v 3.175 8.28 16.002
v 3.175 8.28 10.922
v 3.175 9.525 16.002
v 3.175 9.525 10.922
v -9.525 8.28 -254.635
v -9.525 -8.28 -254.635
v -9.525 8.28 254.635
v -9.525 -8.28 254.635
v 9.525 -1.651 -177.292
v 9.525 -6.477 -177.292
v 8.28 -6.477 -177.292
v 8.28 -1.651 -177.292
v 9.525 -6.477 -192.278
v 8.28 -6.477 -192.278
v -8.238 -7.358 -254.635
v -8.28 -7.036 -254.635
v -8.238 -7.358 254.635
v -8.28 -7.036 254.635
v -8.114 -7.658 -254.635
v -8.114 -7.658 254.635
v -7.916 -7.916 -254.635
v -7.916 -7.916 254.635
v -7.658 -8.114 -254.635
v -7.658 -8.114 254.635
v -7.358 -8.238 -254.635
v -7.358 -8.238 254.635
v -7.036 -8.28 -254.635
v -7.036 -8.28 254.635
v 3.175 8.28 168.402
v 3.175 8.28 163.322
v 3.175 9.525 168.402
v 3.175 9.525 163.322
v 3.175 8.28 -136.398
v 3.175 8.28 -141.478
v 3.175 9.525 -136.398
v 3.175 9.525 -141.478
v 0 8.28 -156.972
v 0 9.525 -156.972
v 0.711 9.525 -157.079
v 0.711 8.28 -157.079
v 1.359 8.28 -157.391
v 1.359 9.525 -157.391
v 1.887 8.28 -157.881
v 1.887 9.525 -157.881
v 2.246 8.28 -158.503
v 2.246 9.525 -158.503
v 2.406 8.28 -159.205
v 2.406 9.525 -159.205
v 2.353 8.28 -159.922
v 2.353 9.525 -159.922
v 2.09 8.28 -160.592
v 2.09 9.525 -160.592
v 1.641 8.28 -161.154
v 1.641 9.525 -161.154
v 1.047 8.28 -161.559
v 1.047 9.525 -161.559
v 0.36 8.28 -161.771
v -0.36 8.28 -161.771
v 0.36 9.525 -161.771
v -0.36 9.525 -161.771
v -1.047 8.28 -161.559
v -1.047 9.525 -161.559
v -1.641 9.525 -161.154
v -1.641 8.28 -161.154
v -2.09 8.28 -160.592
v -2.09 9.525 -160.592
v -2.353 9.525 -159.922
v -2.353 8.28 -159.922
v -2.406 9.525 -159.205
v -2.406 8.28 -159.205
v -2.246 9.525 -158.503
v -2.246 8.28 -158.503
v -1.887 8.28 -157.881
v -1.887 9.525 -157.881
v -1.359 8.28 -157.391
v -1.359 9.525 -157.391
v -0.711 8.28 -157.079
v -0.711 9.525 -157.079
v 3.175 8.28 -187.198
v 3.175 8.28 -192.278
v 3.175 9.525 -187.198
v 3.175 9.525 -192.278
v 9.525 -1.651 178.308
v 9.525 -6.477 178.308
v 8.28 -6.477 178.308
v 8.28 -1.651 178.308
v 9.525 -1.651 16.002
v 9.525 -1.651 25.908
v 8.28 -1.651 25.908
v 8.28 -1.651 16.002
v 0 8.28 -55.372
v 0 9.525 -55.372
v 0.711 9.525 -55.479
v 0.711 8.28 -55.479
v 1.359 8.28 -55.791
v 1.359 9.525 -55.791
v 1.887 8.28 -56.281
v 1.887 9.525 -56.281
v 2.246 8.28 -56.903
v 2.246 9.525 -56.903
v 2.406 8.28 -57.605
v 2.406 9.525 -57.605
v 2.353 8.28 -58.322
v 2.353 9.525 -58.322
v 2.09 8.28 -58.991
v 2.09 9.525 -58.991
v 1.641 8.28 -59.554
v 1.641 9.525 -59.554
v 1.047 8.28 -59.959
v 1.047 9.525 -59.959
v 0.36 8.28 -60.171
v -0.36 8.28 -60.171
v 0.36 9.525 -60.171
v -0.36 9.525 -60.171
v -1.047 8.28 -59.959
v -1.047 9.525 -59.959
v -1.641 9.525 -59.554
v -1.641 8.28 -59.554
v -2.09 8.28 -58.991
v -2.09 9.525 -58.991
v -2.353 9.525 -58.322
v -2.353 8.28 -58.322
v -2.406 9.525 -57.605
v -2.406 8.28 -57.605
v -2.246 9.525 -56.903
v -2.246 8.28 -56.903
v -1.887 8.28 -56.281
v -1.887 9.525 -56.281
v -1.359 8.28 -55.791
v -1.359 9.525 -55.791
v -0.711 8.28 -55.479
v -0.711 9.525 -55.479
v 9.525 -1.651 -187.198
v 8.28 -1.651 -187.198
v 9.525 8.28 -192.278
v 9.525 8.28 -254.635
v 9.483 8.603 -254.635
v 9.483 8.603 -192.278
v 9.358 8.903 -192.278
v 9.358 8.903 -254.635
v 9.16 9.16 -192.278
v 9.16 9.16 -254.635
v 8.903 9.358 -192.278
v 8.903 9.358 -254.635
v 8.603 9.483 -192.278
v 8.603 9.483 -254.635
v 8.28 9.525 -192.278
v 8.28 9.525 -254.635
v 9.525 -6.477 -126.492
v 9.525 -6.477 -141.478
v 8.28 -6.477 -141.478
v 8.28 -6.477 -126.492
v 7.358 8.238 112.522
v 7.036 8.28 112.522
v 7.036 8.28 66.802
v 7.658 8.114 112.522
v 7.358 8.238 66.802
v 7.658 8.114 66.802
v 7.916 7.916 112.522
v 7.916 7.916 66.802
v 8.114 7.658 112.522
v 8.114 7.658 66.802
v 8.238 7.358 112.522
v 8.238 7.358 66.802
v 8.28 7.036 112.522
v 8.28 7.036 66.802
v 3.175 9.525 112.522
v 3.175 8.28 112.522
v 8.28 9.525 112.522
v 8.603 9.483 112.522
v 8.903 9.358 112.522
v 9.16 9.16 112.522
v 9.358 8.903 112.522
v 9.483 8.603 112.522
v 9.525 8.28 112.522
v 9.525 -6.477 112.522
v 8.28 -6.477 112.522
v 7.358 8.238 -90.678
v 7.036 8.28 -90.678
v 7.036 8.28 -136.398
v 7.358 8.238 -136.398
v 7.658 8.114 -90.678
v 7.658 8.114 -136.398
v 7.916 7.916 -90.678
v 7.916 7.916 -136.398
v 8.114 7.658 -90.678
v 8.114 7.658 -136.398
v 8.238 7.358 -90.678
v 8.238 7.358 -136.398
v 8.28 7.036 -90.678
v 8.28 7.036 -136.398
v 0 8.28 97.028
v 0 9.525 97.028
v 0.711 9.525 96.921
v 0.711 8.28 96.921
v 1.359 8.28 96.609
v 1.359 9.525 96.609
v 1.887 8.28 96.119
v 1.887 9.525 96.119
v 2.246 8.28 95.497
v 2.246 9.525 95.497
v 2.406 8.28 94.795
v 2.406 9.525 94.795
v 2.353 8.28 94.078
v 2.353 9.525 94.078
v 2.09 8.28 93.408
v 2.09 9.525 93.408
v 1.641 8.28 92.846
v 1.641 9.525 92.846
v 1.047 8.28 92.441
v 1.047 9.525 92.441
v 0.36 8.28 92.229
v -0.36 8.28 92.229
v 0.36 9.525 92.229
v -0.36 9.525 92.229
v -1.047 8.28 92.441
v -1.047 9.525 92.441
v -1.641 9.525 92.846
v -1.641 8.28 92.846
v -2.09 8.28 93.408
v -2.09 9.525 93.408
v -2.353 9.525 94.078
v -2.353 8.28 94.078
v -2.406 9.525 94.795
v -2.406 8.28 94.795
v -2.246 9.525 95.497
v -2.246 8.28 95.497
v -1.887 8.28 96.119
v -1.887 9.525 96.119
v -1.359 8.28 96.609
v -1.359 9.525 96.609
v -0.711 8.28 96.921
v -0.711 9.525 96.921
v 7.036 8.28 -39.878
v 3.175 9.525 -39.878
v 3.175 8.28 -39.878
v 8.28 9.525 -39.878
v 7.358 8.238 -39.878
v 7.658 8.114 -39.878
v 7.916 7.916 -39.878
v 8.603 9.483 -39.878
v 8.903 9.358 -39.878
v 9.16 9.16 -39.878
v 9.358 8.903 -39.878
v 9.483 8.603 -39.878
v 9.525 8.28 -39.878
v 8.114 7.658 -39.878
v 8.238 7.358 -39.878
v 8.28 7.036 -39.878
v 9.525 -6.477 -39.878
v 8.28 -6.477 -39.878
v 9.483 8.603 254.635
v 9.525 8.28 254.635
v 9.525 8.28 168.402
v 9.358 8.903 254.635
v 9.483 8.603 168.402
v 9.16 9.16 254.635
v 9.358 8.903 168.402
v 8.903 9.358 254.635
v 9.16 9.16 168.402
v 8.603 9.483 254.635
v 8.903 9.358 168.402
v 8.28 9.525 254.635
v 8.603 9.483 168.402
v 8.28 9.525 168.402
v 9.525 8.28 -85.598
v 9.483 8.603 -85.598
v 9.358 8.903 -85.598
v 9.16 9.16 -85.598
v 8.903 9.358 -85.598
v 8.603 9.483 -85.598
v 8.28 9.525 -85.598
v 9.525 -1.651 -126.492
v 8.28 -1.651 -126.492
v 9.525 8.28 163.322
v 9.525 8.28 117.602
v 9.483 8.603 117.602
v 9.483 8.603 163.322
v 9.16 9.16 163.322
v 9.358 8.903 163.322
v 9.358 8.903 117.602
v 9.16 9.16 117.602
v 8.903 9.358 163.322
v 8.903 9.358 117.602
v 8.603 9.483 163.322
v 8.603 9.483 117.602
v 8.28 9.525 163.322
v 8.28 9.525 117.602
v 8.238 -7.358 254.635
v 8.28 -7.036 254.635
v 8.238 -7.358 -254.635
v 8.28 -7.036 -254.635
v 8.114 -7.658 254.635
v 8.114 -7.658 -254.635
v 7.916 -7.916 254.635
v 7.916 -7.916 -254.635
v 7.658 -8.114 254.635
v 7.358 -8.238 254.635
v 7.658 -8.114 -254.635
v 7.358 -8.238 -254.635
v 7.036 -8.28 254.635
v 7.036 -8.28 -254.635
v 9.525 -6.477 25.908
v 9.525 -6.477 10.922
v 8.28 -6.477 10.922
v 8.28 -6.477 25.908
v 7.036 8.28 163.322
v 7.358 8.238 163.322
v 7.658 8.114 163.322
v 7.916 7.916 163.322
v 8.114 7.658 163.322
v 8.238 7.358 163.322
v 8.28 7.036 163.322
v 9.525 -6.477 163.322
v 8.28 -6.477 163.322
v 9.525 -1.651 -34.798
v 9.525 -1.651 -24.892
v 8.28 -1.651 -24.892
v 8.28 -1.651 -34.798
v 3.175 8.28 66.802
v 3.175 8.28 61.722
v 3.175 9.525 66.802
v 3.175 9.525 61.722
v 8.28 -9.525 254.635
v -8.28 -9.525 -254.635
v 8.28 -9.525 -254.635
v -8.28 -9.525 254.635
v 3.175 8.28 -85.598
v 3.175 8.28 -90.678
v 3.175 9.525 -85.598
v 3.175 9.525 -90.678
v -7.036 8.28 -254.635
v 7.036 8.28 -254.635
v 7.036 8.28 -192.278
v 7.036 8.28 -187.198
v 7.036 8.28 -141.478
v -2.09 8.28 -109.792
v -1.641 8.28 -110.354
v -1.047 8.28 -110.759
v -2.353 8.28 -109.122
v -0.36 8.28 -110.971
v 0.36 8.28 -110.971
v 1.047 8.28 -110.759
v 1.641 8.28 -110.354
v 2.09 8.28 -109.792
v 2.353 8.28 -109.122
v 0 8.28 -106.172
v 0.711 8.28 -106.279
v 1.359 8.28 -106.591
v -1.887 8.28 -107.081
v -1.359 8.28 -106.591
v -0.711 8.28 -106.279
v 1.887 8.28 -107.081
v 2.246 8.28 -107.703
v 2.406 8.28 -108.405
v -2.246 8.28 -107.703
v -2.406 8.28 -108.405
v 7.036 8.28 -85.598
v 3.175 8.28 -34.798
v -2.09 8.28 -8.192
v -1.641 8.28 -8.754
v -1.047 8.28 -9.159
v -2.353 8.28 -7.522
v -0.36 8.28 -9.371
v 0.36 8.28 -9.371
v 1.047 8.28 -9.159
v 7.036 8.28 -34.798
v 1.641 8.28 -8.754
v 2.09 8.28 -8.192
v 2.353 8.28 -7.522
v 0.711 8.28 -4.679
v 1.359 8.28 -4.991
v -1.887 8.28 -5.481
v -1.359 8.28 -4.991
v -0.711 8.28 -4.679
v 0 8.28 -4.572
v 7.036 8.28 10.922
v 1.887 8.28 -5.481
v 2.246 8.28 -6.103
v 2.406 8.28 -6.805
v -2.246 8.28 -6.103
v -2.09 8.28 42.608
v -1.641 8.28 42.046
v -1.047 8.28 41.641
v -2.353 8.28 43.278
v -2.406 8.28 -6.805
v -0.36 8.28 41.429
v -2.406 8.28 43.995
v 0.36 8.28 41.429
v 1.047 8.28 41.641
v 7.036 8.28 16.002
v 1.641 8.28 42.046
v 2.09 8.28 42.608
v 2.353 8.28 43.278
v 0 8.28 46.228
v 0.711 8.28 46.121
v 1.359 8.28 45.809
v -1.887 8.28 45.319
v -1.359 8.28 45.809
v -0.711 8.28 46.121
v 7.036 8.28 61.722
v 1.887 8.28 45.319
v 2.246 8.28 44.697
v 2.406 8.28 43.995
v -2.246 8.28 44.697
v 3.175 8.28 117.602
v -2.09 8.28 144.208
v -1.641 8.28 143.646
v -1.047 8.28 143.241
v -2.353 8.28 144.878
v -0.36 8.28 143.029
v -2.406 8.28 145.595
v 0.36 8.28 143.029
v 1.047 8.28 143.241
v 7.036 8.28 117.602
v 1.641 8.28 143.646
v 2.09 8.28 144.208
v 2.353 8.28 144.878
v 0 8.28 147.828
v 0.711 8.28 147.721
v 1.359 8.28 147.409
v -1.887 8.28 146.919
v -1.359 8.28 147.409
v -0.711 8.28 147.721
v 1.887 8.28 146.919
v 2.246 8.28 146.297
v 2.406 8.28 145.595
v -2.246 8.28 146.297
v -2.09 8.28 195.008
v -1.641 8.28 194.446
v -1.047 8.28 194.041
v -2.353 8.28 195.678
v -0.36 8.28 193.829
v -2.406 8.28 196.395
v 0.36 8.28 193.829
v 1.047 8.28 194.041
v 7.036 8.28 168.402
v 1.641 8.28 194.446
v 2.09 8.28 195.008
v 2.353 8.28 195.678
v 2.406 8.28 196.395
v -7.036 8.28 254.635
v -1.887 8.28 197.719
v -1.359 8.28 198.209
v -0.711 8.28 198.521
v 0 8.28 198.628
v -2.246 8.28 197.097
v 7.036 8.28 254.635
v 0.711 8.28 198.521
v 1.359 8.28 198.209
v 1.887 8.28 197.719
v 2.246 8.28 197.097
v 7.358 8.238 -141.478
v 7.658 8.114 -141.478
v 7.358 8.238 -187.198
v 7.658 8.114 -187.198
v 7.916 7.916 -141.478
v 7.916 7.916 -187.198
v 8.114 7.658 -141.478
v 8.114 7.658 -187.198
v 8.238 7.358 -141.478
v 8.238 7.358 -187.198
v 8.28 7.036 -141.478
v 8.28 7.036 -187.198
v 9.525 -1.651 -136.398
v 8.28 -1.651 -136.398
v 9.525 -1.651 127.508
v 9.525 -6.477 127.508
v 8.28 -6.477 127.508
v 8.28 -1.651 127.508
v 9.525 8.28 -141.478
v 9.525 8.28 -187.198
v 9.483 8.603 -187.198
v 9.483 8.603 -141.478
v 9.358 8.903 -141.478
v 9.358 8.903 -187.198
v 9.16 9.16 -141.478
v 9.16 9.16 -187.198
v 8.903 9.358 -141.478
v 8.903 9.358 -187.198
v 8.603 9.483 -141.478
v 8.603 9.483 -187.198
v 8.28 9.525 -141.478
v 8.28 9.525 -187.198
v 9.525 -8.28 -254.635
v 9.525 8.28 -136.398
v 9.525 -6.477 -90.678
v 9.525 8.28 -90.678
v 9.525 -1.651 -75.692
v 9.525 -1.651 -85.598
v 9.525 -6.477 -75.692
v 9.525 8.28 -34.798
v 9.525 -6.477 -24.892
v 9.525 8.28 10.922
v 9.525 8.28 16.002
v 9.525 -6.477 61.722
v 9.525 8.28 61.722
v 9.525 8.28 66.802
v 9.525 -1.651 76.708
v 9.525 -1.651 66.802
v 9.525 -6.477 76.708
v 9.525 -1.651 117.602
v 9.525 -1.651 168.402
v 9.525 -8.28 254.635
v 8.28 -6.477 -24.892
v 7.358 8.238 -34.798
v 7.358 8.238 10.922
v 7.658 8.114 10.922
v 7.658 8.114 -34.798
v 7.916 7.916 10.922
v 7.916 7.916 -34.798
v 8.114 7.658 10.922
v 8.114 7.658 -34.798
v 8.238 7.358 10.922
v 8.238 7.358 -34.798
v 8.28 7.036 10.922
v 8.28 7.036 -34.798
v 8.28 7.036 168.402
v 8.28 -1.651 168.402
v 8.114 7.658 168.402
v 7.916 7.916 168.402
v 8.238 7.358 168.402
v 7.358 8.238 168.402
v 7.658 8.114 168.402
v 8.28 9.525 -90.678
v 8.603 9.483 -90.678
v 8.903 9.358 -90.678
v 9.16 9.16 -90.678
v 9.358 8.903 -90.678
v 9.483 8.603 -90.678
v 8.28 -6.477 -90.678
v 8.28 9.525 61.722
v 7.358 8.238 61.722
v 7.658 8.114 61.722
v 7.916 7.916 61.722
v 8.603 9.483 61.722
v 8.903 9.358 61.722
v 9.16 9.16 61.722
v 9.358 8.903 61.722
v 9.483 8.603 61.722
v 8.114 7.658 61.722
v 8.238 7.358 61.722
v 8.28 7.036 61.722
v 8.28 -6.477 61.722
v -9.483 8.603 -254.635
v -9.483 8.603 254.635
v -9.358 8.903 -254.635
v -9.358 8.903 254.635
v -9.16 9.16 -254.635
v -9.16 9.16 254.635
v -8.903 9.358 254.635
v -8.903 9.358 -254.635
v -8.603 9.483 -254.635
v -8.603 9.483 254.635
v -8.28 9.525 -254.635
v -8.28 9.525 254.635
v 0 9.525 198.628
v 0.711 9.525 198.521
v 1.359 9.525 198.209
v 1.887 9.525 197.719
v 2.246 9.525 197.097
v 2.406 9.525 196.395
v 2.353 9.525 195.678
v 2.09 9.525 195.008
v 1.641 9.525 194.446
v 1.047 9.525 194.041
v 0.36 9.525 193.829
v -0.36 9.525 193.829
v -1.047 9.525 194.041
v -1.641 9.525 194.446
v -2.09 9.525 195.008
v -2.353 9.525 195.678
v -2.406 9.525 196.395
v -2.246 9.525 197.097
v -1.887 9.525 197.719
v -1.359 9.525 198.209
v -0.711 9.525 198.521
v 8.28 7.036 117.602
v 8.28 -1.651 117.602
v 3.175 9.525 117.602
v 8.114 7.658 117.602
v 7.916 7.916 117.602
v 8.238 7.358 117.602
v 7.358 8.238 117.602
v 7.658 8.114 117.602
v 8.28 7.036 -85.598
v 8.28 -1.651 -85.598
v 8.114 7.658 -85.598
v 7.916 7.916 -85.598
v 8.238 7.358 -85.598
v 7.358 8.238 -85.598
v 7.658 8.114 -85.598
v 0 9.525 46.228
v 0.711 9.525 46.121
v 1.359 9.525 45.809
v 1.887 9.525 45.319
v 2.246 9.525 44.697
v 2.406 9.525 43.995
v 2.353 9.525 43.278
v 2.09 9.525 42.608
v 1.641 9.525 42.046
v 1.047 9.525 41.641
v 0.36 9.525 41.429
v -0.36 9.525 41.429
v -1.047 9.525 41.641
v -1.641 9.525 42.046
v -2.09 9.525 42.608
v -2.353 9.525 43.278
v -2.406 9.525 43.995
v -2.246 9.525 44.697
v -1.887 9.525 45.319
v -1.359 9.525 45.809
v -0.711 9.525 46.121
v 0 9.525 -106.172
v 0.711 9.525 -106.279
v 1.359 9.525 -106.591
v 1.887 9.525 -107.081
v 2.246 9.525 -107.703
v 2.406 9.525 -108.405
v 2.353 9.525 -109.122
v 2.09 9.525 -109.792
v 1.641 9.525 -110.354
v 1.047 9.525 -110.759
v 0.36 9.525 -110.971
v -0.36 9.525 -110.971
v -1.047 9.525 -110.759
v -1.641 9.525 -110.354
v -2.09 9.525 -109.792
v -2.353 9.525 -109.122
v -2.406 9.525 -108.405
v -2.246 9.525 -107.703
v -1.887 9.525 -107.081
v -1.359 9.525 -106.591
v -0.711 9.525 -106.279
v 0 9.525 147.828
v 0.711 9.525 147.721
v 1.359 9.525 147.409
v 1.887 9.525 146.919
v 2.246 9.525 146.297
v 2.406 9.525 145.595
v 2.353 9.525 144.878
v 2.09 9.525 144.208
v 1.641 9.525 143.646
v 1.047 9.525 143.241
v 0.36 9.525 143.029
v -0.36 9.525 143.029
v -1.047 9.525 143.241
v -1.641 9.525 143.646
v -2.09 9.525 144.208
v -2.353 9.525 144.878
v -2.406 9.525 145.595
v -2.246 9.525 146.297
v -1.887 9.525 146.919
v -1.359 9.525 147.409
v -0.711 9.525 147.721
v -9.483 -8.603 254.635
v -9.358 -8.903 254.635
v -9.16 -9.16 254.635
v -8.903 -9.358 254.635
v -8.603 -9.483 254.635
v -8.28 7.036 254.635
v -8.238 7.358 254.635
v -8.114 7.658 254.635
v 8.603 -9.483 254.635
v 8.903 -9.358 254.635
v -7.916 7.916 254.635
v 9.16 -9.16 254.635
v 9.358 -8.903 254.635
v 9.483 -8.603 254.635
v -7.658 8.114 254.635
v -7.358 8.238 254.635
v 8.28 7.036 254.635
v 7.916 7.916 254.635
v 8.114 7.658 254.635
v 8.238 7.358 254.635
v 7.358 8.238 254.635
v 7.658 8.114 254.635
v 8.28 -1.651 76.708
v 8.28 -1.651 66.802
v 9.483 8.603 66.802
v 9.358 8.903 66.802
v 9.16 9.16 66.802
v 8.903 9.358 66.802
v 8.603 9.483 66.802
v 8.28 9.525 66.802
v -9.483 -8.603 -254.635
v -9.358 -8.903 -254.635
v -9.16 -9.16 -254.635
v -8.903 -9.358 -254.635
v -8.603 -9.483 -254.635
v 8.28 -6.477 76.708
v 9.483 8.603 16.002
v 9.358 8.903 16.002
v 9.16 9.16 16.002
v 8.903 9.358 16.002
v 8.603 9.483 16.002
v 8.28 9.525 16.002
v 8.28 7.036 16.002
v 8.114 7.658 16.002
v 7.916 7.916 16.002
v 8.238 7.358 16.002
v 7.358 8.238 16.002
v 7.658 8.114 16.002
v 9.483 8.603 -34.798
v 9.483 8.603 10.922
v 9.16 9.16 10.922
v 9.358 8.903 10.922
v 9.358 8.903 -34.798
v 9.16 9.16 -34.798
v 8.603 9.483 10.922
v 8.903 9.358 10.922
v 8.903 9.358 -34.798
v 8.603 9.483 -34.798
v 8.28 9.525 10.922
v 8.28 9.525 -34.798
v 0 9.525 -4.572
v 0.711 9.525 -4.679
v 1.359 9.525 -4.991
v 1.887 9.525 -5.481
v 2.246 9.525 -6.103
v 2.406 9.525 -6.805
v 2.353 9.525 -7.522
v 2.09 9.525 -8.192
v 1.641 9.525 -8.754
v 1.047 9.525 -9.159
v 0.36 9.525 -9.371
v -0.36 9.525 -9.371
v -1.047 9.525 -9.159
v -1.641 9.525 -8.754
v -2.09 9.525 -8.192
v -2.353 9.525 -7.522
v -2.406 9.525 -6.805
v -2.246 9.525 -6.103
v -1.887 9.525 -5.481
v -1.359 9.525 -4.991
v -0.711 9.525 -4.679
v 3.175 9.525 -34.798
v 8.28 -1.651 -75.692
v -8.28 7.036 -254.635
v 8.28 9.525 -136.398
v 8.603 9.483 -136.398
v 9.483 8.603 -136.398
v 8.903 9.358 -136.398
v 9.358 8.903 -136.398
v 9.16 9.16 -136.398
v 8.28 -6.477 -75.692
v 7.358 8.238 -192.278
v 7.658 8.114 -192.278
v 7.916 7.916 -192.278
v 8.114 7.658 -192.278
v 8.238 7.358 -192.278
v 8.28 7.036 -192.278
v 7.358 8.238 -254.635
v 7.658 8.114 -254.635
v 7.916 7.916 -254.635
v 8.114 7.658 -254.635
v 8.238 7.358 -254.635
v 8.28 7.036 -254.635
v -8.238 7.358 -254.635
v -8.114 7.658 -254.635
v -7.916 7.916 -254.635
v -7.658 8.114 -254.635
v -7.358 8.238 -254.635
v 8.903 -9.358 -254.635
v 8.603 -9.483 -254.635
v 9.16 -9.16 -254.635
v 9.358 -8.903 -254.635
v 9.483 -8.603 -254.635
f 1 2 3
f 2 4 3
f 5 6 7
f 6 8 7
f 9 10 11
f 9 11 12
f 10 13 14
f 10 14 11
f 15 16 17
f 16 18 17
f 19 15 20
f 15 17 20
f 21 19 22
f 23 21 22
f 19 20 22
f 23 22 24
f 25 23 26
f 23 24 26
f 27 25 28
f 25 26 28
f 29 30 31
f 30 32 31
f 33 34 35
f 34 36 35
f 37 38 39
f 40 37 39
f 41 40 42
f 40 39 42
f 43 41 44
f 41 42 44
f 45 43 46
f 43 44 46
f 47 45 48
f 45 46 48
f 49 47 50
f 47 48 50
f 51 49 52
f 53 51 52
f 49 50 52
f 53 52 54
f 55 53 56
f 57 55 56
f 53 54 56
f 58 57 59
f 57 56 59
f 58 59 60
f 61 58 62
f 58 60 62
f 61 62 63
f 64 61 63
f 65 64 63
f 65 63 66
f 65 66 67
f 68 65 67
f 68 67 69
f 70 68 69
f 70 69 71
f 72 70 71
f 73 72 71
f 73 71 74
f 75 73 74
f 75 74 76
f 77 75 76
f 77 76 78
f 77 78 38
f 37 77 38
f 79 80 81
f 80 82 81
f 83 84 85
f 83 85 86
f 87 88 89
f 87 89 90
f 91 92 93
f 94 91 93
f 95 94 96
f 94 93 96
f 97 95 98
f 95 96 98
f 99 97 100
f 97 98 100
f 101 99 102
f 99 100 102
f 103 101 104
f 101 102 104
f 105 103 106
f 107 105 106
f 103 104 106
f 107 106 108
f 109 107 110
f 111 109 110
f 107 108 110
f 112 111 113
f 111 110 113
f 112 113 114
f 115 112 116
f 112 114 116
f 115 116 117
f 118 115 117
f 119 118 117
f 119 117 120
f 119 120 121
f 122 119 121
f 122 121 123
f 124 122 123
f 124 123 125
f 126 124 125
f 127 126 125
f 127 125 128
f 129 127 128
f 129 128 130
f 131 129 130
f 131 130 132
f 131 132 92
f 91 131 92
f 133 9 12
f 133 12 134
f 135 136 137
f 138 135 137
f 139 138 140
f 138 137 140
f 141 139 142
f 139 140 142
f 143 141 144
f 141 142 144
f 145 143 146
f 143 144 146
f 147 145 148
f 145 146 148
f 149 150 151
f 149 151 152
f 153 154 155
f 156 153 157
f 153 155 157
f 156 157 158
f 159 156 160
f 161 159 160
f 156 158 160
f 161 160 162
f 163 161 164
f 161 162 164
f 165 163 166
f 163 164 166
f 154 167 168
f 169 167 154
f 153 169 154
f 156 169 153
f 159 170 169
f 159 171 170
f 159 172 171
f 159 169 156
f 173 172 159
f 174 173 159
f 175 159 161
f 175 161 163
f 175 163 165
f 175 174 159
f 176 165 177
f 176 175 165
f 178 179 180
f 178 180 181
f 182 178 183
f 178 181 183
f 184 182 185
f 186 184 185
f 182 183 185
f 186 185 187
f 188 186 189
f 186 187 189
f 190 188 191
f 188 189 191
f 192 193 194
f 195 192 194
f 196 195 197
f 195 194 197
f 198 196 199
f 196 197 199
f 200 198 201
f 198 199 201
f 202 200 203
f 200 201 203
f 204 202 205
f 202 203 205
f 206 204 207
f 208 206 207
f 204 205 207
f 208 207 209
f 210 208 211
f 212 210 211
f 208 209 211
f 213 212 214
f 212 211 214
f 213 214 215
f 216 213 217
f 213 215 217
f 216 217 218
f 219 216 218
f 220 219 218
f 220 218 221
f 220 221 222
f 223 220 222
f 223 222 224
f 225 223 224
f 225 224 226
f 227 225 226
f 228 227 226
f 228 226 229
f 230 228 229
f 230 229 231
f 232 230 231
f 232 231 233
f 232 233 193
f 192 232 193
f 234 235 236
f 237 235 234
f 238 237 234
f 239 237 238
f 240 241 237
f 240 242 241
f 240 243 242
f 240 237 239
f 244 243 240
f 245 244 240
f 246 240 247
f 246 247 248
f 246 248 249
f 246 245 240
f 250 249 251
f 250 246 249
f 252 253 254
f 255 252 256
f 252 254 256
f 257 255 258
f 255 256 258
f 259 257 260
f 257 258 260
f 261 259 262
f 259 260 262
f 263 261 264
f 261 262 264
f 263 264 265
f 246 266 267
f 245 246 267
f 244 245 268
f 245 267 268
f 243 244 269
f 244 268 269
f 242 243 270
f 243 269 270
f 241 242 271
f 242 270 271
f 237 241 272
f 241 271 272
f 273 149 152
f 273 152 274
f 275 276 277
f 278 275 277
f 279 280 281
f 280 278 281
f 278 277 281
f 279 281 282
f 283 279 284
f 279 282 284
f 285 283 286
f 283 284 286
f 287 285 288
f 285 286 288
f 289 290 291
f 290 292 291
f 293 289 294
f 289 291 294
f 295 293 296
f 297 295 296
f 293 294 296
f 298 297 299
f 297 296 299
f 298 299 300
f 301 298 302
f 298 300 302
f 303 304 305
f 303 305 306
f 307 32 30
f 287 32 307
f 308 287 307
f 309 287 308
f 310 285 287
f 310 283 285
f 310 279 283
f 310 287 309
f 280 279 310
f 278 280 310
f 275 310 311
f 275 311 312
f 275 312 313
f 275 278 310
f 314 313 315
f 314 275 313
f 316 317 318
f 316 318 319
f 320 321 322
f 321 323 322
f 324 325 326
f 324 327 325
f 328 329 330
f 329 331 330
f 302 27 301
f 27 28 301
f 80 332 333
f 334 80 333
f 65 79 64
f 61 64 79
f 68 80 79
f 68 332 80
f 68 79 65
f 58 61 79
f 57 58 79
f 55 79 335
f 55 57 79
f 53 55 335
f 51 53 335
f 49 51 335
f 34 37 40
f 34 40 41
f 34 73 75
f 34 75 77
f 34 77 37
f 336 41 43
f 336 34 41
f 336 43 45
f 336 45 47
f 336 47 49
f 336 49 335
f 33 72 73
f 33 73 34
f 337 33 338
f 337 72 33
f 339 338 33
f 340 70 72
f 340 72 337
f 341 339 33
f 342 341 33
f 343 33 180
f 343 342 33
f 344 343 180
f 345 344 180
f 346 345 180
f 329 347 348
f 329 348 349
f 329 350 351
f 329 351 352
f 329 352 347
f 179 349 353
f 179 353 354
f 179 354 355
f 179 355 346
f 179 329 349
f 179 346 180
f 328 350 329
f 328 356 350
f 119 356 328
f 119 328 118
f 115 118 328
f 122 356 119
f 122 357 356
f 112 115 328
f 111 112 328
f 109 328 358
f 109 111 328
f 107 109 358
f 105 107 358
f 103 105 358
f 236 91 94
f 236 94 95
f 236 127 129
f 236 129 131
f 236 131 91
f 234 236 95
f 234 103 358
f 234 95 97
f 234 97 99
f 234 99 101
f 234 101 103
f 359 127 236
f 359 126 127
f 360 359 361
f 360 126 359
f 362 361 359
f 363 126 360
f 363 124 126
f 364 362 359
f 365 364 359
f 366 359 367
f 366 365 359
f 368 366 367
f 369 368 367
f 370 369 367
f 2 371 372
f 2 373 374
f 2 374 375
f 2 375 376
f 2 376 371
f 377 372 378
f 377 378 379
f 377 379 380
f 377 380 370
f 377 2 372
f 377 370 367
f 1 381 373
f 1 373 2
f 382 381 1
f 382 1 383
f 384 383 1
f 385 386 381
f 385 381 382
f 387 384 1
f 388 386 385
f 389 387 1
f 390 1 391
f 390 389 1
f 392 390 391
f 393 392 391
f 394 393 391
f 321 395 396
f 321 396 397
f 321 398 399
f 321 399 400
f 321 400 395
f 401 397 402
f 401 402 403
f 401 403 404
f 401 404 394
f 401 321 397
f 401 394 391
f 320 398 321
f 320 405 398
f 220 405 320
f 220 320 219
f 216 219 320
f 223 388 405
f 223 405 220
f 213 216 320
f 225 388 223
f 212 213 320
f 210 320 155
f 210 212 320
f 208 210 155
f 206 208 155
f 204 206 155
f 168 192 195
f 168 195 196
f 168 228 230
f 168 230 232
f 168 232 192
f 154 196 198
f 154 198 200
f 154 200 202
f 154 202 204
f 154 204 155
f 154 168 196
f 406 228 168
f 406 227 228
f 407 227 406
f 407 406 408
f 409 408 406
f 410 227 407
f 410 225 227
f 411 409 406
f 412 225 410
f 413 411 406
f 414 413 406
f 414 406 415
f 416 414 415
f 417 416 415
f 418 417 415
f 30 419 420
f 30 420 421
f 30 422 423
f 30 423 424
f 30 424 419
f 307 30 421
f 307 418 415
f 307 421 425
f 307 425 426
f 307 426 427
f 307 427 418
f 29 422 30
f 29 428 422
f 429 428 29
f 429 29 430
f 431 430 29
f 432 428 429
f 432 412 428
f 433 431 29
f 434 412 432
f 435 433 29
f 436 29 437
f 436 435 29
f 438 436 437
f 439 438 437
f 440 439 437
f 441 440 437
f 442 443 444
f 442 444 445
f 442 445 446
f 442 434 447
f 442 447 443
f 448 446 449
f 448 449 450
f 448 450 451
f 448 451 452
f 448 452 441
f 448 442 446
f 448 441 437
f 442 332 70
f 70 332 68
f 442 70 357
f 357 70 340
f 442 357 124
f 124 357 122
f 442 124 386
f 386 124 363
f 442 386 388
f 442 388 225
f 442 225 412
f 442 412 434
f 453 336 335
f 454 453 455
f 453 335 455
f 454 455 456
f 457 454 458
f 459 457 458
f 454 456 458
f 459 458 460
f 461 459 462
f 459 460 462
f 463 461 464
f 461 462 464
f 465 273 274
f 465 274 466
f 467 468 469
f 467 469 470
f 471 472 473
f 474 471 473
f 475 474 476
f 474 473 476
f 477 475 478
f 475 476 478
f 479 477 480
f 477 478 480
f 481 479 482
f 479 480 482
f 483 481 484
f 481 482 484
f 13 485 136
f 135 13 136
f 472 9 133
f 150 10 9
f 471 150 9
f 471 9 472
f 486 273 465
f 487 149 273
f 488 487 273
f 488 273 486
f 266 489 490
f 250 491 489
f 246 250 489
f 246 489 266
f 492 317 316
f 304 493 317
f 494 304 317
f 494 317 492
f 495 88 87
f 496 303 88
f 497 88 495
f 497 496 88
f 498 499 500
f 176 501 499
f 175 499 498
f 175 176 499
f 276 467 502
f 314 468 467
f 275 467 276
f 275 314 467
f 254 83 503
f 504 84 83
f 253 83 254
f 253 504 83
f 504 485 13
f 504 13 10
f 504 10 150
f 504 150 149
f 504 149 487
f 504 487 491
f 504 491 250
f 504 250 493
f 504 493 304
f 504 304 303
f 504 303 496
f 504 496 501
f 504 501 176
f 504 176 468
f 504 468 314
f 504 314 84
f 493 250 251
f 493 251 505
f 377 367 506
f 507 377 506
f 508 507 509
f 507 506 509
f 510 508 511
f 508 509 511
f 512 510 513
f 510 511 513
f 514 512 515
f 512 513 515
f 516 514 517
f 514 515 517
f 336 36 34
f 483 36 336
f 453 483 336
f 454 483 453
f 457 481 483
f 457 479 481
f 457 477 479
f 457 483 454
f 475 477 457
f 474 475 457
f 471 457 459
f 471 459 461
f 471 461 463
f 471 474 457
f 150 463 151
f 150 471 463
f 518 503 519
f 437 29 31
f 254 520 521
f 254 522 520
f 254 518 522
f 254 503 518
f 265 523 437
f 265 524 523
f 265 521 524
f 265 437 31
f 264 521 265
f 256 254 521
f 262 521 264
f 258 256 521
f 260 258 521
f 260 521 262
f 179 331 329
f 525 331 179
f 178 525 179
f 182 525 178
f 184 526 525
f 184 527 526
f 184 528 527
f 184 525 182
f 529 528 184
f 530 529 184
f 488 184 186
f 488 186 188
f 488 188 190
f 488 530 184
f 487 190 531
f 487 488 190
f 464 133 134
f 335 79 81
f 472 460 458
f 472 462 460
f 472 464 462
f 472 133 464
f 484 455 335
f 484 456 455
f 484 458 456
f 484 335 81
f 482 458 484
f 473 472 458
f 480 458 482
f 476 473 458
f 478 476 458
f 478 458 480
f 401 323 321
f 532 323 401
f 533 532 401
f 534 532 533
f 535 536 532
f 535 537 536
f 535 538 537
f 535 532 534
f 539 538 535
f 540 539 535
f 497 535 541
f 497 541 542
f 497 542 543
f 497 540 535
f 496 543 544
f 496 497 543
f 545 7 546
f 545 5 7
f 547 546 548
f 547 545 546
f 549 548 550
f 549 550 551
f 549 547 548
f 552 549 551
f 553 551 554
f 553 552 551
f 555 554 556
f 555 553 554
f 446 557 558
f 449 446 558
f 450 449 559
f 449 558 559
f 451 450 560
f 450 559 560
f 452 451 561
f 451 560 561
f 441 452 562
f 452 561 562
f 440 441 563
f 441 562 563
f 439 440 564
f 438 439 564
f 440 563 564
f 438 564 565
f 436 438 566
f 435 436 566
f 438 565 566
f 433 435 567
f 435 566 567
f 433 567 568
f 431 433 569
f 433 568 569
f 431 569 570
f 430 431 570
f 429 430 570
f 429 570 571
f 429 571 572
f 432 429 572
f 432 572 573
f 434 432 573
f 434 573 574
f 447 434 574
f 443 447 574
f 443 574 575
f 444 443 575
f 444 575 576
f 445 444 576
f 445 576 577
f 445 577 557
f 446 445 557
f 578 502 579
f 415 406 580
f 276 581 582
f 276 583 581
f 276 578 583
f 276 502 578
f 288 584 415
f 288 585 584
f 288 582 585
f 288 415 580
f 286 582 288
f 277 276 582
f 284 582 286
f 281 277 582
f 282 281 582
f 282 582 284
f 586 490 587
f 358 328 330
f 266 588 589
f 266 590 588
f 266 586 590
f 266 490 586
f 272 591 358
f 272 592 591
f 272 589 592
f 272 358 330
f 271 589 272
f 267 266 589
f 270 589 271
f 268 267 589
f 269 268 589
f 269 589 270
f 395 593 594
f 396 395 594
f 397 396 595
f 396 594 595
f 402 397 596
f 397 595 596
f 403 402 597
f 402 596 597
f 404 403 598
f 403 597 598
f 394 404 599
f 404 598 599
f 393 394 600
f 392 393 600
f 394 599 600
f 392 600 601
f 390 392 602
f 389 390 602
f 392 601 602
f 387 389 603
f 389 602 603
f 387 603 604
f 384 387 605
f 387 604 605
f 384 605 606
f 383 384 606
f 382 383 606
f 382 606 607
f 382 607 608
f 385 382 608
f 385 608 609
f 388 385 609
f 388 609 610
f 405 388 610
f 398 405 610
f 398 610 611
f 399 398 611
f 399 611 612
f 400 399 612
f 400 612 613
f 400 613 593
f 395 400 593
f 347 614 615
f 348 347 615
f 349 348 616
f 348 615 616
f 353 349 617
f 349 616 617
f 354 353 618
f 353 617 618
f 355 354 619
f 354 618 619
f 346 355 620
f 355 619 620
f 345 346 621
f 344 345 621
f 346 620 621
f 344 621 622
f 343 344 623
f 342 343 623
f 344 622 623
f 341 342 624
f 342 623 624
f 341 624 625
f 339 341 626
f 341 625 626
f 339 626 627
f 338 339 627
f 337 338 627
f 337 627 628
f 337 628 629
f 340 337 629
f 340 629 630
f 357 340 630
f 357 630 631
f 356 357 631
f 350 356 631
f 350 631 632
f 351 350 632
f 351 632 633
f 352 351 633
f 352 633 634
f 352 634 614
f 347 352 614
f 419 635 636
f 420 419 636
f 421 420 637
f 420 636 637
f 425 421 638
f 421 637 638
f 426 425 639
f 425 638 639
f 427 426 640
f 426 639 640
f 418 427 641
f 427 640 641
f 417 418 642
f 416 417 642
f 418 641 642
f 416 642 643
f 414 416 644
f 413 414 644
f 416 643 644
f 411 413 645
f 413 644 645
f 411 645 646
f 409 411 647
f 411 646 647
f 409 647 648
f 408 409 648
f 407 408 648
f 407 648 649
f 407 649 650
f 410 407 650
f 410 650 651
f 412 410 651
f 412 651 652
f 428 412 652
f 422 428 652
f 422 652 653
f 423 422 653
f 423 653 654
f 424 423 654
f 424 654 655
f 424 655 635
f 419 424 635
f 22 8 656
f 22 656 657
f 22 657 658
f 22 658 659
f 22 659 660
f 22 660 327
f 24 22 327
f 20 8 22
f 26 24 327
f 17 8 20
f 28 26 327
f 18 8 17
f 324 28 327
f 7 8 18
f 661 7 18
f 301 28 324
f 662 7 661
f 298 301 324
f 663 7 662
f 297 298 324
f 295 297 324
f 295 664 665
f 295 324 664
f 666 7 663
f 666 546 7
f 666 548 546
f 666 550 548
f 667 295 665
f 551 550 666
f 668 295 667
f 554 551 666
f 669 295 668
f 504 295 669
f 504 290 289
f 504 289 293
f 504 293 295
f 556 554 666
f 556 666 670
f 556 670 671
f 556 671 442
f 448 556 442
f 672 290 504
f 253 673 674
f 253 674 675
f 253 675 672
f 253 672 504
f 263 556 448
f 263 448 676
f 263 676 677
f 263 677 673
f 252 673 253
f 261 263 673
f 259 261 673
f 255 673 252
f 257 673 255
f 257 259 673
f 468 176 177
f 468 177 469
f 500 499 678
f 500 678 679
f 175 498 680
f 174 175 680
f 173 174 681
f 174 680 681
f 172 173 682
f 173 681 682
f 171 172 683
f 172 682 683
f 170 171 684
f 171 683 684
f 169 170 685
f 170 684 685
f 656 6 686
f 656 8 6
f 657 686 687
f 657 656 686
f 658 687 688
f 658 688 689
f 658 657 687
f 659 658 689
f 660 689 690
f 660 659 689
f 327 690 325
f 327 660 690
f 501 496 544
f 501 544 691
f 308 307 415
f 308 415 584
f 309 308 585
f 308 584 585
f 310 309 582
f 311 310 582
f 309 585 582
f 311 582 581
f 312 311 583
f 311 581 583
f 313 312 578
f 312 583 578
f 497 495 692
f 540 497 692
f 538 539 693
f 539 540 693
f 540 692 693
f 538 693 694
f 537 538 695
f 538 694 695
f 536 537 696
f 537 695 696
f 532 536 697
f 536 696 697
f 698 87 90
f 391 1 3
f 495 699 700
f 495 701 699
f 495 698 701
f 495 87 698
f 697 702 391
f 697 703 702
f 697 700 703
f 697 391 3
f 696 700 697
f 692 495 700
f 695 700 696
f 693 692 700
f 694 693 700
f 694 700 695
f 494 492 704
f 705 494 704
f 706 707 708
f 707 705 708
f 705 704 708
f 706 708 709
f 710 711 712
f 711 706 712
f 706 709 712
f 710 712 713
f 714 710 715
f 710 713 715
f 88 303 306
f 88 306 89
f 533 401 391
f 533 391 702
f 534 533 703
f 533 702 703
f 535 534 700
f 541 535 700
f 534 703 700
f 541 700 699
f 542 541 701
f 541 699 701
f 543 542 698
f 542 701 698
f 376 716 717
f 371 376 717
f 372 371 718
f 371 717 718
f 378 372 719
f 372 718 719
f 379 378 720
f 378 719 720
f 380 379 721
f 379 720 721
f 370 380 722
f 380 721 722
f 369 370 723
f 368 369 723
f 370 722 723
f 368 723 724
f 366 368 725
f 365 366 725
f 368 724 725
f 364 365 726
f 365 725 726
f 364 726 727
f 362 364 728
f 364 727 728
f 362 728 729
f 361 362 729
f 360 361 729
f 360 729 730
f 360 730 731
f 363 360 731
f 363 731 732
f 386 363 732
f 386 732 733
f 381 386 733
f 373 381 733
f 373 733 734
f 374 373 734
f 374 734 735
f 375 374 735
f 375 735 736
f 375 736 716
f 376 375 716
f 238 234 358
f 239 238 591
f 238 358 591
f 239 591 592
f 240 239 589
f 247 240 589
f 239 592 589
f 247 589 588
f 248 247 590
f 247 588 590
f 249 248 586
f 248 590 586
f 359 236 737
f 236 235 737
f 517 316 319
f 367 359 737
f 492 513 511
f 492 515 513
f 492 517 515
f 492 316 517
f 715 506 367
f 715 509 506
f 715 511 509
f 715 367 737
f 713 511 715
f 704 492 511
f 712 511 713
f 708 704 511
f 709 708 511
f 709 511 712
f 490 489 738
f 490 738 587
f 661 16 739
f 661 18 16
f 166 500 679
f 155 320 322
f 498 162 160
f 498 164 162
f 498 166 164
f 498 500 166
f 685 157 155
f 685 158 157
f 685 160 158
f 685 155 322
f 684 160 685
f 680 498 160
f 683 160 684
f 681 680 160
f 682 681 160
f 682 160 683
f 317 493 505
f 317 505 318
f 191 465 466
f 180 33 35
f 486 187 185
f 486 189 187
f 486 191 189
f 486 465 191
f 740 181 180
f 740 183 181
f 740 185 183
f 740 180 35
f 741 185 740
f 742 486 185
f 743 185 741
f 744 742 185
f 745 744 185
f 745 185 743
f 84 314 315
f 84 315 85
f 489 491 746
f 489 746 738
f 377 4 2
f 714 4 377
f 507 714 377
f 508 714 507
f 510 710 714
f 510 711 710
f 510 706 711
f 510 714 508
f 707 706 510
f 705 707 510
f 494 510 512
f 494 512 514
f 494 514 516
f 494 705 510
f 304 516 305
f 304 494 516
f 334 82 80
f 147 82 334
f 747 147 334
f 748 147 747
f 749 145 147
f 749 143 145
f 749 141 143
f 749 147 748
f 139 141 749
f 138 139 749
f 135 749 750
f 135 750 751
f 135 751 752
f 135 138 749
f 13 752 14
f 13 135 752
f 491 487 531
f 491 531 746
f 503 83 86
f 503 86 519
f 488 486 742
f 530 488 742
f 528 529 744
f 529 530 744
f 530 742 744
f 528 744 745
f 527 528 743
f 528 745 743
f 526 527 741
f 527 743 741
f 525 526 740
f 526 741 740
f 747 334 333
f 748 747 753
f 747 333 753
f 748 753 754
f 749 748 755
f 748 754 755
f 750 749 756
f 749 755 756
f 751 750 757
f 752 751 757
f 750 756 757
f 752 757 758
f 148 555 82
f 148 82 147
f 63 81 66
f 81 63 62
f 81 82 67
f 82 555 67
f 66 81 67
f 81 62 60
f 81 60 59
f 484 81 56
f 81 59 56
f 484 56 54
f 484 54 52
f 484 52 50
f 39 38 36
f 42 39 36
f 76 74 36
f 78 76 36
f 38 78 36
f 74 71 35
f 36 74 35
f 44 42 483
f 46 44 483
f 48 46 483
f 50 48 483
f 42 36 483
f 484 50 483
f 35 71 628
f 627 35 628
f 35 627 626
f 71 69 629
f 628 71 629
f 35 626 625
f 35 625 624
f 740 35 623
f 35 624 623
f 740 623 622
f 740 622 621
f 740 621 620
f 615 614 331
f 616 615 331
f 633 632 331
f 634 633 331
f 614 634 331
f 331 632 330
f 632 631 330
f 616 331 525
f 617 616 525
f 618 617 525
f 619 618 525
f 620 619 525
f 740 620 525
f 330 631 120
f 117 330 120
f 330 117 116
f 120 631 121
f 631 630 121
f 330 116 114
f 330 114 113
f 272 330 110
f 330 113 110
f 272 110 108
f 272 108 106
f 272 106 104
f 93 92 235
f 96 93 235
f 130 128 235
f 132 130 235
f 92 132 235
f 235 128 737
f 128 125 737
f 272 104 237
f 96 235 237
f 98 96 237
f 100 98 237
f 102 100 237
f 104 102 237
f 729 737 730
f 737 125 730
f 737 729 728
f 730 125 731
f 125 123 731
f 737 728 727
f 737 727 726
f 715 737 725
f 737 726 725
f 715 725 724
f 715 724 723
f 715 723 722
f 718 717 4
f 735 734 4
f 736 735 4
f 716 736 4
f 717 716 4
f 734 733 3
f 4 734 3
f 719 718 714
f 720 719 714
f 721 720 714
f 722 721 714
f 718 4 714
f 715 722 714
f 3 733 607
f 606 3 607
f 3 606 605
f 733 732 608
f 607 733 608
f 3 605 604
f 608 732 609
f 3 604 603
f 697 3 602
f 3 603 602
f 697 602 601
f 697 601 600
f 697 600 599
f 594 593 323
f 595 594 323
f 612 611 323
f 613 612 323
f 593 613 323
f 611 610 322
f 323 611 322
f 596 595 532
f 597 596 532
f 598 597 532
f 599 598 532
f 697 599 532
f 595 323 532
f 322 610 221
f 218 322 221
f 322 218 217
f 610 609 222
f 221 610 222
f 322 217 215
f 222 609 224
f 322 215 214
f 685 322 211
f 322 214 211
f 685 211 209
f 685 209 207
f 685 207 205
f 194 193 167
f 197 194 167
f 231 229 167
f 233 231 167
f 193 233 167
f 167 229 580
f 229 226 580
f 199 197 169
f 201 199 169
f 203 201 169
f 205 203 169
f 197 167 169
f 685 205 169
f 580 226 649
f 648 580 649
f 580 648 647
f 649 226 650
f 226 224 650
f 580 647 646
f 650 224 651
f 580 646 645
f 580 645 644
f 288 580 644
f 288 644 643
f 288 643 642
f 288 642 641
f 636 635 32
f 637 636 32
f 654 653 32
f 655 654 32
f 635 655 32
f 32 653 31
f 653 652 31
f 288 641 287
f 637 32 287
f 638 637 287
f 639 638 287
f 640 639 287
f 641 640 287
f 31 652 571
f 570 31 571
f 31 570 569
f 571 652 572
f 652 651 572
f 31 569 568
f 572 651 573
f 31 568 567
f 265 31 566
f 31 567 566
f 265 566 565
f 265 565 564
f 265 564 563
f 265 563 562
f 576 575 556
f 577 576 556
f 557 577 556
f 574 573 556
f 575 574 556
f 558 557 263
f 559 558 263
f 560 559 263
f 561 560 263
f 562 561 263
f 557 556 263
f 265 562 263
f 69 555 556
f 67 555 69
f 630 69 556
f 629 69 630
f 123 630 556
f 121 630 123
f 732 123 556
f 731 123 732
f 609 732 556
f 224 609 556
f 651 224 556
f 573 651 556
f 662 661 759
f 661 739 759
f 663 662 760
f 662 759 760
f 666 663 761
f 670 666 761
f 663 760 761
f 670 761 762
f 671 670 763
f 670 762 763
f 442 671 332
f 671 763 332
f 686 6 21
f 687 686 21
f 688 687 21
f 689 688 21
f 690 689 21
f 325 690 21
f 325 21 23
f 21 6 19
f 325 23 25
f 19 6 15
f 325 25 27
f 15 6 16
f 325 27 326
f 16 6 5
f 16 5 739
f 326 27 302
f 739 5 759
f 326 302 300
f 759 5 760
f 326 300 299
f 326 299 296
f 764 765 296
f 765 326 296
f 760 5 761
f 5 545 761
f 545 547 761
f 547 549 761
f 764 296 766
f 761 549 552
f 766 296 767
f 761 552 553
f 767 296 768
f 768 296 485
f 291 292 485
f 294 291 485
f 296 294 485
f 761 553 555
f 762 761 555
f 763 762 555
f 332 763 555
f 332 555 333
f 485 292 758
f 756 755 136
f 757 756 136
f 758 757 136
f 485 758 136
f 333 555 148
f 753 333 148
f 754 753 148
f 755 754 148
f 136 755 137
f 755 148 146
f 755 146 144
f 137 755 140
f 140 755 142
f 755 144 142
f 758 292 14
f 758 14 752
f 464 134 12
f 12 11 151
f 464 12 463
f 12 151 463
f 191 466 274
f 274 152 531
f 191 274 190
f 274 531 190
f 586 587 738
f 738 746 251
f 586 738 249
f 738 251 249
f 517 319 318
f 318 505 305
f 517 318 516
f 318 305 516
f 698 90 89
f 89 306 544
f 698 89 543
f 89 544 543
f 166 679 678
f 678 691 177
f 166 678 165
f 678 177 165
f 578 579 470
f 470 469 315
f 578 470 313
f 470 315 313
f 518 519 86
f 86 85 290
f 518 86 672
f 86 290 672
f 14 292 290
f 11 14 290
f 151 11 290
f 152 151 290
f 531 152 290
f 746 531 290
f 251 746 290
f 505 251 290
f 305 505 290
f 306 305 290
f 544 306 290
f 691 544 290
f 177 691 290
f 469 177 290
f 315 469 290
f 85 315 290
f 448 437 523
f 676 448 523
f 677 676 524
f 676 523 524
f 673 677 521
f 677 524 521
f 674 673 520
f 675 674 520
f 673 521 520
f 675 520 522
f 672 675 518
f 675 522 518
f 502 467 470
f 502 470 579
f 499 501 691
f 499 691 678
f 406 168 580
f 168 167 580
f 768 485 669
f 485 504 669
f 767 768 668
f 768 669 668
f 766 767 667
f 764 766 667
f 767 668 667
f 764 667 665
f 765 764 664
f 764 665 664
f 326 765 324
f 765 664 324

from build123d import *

# Parameters (mm, degrees)
SKETCH3_W           = 19.05
SKETCH3_H           = 19.05
SKETCH3_W_2         = 16.5608
SKETCH3_H_2         = 16.5608
BOSS_EXTRUDE1_DEPTH = 254.635
FILLET1_R           = 1.2446
CUT_EXTRUDE1_REACH  = 257.524
SKETCH4_R           = 2.413
CUT_EXTRUDE3_START  = -19.05
CUT_EXTRUDE3_DEPTH  = 6.35
LPATTERN2_COUNT     = 8
LPATTERN2_PITCH     = 50.8


with BuildPart() as part:
    # Sketch3 → Boss-Extrude1 (new, symmetric)
    with BuildSketch(Plane.XY):
        Rectangle(SKETCH3_W, SKETCH3_H)
        Rectangle(SKETCH3_W_2, SKETCH3_H_2, mode=Mode.SUBTRACT)
    extrude(amount=BOSS_EXTRUDE1_DEPTH, both=True)

    # Fillet1
    fillet1_edges = [part.edges().sort_by_distance(p)[0] for p in [
        (-8.2804, -8.2804, 0),
        (8.2804, -8.2804, 0),
        (8.2804, 8.2804, 0),
        (-8.2804, 8.2804, 0),
        (9.525, -9.525, 0),
        (-9.525, -9.525, 0),
        (-9.525, 9.525, 0),
        (9.525, 9.525, 0),
    ]]
    fillet(fillet1_edges, radius=FILLET1_R)

    # Sketch4 → Cut-Extrude1 (cut, up to next)
    with BuildSketch(Plane(origin=(0, 9.525, 0), x_dir=(1, 0, 0), z_dir=(0, 1, 0)), mode=Mode.PRIVATE) as cut_extrude1_sk1:
        with Locations(Location((0, 159.385, 0), (0, 0, 270))):
            Circle(SKETCH4_R)
    cut_extrude1_tool1 = extrude(cut_extrude1_sk1.sketch, amount=-CUT_EXTRUDE1_REACH, mode=Mode.PRIVATE) & part.part
    # Sketch4 → Cut-Extrude1 (cut, up to next)
    with BuildSketch(Plane(origin=(0, 9.525, 0), x_dir=(1, 0, 0), z_dir=(0, 1, 0)), mode=Mode.PRIVATE) as cut_extrude1_sk2:
        with Locations(Location((0, 108.585, 0), (0, 0, 270))):
            Circle(SKETCH4_R)
    cut_extrude1_tool2 = extrude(cut_extrude1_sk2.sketch, amount=-CUT_EXTRUDE1_REACH, mode=Mode.PRIVATE) & part.part
    # Sketch4 → Cut-Extrude1 (cut, up to next)
    with BuildSketch(Plane(origin=(0, 9.525, 0), x_dir=(1, 0, 0), z_dir=(0, 1, 0)), mode=Mode.PRIVATE) as cut_extrude1_sk3:
        with Locations(Location((0, 57.785, 0), (0, 0, 270))):
            Circle(SKETCH4_R)
    cut_extrude1_tool3 = extrude(cut_extrude1_sk3.sketch, amount=-CUT_EXTRUDE1_REACH, mode=Mode.PRIVATE) & part.part
    # Sketch4 → Cut-Extrude1 (cut, up to next)
    with BuildSketch(Plane(origin=(0, 9.525, 0), x_dir=(1, 0, 0), z_dir=(0, 1, 0)), mode=Mode.PRIVATE) as cut_extrude1_sk4:
        with Locations(Location((0, 6.985, 0), (0, 0, 270))):
            Circle(SKETCH4_R)
    cut_extrude1_tool4 = extrude(cut_extrude1_sk4.sketch, amount=-CUT_EXTRUDE1_REACH, mode=Mode.PRIVATE) & part.part
    # Sketch4 → Cut-Extrude1 (cut, up to next)
    with BuildSketch(Plane(origin=(0, 9.525, 0), x_dir=(1, 0, 0), z_dir=(0, 1, 0)), mode=Mode.PRIVATE) as cut_extrude1_sk5:
        with Locations(Location((0, -43.815, 0), (0, 0, 270))):
            Circle(SKETCH4_R)
    cut_extrude1_tool5 = extrude(cut_extrude1_sk5.sketch, amount=-CUT_EXTRUDE1_REACH, mode=Mode.PRIVATE) & part.part
    # Sketch4 → Cut-Extrude1 (cut, up to next)
    with BuildSketch(Plane(origin=(0, 9.525, 0), x_dir=(1, 0, 0), z_dir=(0, 1, 0)), mode=Mode.PRIVATE) as cut_extrude1_sk6:
        with Locations(Location((0, -94.615, 0), (0, 0, 270))):
            Circle(SKETCH4_R)
    cut_extrude1_tool6 = extrude(cut_extrude1_sk6.sketch, amount=-CUT_EXTRUDE1_REACH, mode=Mode.PRIVATE) & part.part
    # Sketch4 → Cut-Extrude1 (cut, up to next)
    with BuildSketch(Plane(origin=(0, 9.525, 0), x_dir=(1, 0, 0), z_dir=(0, 1, 0)), mode=Mode.PRIVATE) as cut_extrude1_sk7:
        with Locations(Location((0, -145.415, 0), (0, 0, 270))):
            Circle(SKETCH4_R)
    cut_extrude1_tool7 = extrude(cut_extrude1_sk7.sketch, amount=-CUT_EXTRUDE1_REACH, mode=Mode.PRIVATE) & part.part
    # Sketch4 → Cut-Extrude1 (cut, up to next)
    with BuildSketch(Plane(origin=(0, 9.525, 0), x_dir=(1, 0, 0), z_dir=(0, 1, 0)), mode=Mode.PRIVATE) as cut_extrude1_sk8:
        with Locations(Location((0, -196.215, 0), (0, 0, 270))):
            Circle(SKETCH4_R)
    cut_extrude1_tool8 = extrude(cut_extrude1_sk8.sketch, amount=-CUT_EXTRUDE1_REACH, mode=Mode.PRIVATE) & part.part
    add(cut_extrude1_tool1.solids().sort_by_distance((0, 9.525, -159.385))[0], mode=Mode.SUBTRACT)
    add(cut_extrude1_tool2.solids().sort_by_distance((0, 9.525, -108.585))[0], mode=Mode.SUBTRACT)
    add(cut_extrude1_tool3.solids().sort_by_distance((0, 9.525, -57.785))[0], mode=Mode.SUBTRACT)
    add(cut_extrude1_tool4.solids().sort_by_distance((0, 9.525, -6.985))[0], mode=Mode.SUBTRACT)
    add(cut_extrude1_tool5.solids().sort_by_distance((0, 9.525, 43.815))[0], mode=Mode.SUBTRACT)
    add(cut_extrude1_tool6.solids().sort_by_distance((0, 9.525, 94.615))[0], mode=Mode.SUBTRACT)
    add(cut_extrude1_tool7.solids().sort_by_distance((0, 9.525, 145.415))[0], mode=Mode.SUBTRACT)
    add(cut_extrude1_tool8.solids().sort_by_distance((0, 9.525, 196.215))[0], mode=Mode.SUBTRACT)

    # Sketch6 → Cut-Extrude3 (cut)
    with BuildSketch(Plane.ZY.offset(9.525).offset(CUT_EXTRUDE3_START)):
        Polygon((-182.118, -1.651), (-187.198, -1.651), (-187.198, 9.525), (-192.278, 9.525), (-192.278, -6.477), (-182.118, -6.477), (-177.292, -6.477), (-177.292, -1.651), align=None)
    cut_extrude3 = extrude(amount=CUT_EXTRUDE3_DEPTH, mode=Mode.SUBTRACT)

    # LPattern2: Cut-Extrude3 ×8
    with Locations(*[(0, 0, i * LPATTERN2_PITCH) for i in range(1, LPATTERN2_COUNT)]):
        add(cut_extrude3, mode=Mode.SUBTRACT)


solid = part.part
